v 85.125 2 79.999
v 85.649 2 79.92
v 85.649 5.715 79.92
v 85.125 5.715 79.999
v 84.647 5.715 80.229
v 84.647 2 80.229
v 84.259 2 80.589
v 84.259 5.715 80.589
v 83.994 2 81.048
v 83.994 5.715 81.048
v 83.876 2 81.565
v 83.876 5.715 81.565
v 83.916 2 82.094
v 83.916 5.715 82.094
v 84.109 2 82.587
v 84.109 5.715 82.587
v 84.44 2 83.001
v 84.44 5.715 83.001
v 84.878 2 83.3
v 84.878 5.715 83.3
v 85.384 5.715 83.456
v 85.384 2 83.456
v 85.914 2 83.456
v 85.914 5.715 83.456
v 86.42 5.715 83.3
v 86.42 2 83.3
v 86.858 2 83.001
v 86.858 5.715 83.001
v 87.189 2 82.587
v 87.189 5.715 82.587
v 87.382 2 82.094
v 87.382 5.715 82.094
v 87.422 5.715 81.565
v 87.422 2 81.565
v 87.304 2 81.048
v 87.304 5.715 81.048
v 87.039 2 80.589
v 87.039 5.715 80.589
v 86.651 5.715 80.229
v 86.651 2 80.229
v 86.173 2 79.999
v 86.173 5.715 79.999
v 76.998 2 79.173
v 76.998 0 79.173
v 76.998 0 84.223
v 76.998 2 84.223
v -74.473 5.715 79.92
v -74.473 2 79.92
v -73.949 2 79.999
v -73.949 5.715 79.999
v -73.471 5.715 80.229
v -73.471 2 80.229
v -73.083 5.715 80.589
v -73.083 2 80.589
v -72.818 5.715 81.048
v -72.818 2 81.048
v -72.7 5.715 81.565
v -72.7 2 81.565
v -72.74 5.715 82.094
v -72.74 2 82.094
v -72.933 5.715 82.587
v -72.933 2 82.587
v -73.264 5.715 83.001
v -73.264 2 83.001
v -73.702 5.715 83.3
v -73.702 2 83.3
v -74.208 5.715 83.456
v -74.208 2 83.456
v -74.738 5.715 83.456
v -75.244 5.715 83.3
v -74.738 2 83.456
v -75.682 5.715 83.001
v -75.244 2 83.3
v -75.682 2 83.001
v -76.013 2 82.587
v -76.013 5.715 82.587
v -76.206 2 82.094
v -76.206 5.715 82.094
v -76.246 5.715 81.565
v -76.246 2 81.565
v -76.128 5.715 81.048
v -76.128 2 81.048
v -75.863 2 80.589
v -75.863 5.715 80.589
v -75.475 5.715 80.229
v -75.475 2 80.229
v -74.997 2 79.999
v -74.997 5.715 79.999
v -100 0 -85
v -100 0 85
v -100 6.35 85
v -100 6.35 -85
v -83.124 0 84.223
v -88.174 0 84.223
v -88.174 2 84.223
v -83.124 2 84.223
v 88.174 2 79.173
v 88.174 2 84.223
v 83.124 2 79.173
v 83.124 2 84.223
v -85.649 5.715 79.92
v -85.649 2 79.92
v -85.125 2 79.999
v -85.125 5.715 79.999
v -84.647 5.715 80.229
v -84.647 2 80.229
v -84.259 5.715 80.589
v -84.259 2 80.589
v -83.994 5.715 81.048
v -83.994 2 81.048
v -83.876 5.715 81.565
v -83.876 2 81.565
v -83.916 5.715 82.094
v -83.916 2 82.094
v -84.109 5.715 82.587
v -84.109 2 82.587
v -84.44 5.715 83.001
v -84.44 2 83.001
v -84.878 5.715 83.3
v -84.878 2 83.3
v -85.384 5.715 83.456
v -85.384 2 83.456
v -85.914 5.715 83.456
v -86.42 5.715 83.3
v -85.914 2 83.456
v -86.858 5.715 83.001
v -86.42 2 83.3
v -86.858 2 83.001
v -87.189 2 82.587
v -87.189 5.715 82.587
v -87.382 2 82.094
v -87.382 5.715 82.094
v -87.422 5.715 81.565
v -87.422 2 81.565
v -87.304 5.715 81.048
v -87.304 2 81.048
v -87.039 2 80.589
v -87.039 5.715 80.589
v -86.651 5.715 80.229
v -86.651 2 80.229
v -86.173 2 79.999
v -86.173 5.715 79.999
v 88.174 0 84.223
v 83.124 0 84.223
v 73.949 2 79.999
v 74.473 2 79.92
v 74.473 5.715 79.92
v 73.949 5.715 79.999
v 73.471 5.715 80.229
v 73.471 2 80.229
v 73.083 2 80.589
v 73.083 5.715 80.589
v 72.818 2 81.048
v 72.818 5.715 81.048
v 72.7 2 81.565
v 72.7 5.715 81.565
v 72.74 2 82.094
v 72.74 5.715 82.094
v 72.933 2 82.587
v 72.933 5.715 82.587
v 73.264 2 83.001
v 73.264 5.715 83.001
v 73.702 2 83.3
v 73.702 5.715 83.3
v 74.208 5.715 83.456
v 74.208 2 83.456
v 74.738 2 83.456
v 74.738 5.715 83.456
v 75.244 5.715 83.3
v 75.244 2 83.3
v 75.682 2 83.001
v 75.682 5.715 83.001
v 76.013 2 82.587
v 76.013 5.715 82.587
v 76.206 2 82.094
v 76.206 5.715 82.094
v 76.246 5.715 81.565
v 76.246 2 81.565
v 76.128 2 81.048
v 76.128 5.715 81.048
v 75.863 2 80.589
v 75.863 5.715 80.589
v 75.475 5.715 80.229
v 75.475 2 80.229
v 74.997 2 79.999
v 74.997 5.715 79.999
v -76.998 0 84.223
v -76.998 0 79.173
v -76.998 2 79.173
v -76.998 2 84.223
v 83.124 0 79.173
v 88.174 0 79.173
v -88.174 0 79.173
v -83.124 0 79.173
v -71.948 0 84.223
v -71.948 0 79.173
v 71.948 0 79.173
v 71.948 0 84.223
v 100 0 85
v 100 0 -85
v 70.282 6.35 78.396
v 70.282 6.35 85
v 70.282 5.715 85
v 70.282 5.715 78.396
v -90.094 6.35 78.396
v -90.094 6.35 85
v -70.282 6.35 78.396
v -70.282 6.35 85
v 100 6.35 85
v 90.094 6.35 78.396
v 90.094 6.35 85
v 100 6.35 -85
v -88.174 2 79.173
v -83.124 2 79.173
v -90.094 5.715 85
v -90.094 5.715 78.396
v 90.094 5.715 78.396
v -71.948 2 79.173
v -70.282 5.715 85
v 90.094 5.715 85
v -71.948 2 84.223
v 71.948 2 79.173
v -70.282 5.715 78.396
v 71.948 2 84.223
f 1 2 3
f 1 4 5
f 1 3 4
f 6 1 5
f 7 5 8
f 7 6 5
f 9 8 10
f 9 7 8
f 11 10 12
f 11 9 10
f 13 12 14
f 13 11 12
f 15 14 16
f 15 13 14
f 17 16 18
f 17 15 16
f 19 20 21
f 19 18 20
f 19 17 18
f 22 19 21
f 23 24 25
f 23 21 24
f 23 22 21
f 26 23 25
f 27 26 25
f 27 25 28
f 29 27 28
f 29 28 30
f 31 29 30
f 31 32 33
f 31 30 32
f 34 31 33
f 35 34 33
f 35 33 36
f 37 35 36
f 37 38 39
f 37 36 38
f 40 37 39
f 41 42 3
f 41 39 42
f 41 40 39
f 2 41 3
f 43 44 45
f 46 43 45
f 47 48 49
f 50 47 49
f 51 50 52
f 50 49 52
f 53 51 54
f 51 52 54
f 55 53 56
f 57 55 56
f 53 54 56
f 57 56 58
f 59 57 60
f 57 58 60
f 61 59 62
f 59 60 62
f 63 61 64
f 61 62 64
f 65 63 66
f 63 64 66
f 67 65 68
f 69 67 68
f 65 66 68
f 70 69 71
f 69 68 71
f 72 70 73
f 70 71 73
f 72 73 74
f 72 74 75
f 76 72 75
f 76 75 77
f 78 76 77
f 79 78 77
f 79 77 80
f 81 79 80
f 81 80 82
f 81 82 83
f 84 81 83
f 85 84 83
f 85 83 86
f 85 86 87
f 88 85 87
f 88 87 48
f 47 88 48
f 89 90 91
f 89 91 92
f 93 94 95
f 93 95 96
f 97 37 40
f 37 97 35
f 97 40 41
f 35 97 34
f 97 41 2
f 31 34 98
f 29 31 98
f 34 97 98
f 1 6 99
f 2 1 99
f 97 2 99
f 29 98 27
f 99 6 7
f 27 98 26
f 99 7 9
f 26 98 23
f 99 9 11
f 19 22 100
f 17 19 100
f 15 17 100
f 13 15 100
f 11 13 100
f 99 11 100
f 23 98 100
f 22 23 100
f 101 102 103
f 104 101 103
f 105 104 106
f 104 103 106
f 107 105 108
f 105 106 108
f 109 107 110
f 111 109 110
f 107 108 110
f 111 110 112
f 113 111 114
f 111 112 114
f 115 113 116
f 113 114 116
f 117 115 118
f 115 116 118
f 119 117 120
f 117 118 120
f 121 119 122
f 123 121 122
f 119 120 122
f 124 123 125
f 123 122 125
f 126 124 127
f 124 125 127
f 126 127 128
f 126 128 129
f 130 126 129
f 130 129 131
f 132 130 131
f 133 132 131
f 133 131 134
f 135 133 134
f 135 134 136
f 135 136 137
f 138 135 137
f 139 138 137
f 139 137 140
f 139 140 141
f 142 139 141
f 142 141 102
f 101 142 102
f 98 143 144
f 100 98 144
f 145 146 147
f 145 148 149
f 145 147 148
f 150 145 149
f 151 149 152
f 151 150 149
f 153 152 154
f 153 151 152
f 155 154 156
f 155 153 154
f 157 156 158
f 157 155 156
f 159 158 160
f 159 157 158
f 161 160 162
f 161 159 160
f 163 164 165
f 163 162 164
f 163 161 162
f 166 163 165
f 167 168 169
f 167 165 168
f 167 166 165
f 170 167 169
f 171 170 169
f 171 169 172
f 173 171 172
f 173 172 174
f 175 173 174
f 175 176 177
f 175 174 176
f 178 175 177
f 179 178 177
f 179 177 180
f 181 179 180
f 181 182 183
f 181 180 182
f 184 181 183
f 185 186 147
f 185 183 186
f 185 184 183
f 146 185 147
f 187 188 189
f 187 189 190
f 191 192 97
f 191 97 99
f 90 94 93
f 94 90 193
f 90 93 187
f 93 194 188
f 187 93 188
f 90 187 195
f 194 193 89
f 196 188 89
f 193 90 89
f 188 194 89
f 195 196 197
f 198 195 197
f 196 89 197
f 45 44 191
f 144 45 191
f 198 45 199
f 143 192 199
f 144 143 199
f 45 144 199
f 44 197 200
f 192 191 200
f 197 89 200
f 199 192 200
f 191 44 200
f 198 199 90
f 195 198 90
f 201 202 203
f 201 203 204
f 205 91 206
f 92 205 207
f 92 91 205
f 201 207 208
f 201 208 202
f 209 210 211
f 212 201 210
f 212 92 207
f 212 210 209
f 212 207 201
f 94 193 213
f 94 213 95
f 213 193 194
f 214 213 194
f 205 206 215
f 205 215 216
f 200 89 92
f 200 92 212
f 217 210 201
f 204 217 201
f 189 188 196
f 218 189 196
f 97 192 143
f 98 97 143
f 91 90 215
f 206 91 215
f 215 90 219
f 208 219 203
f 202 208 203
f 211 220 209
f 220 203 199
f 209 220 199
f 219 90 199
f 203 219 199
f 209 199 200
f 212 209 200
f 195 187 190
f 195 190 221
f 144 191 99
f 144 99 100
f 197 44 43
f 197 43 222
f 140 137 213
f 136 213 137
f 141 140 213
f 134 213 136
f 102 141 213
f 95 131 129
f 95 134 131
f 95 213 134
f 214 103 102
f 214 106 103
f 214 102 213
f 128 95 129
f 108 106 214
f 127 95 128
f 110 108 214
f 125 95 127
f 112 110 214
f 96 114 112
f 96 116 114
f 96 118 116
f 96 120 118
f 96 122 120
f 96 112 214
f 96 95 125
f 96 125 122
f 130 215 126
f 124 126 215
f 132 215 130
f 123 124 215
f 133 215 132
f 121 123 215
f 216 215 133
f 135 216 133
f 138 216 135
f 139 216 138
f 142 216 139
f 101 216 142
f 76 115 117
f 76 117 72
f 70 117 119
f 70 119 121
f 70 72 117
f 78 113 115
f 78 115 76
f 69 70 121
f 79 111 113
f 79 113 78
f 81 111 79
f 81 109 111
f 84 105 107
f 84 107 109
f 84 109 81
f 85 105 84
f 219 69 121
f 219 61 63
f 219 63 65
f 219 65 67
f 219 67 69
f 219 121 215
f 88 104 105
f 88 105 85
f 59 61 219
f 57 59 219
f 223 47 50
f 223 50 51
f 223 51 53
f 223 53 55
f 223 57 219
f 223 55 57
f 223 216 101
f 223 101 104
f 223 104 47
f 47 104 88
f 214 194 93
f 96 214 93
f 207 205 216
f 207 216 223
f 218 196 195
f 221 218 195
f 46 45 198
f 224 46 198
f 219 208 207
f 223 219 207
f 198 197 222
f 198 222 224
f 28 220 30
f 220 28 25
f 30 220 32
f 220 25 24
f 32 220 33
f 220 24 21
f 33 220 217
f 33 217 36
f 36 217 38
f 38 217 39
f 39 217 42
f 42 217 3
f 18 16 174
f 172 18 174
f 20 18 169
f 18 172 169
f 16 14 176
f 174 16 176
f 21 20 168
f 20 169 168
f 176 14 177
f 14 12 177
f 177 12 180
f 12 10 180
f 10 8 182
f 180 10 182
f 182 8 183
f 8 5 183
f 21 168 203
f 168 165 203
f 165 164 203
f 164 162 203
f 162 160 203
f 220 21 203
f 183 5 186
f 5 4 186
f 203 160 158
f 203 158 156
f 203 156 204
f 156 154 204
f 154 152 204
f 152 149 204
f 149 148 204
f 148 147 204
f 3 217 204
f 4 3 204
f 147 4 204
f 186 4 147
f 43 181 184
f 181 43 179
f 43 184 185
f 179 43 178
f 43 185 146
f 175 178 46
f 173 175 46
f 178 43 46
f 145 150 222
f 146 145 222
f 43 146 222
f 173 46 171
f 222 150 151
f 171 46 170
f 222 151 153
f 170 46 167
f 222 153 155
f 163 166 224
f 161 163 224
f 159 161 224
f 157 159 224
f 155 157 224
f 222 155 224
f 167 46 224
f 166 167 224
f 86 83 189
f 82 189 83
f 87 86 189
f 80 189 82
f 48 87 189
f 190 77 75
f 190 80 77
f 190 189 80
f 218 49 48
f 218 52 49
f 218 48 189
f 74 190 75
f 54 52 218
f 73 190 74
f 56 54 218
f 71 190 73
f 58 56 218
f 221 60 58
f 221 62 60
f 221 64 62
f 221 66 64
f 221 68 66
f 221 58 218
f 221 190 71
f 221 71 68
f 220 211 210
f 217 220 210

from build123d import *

# Parameters (mm, degrees)
SKETCH1_W               = 200
SKETCH1_H               = 170
F_1_4_STEEL_PLATE_DEPTH = 6.35
SKETCH2_W               = 19.812
SKETCH2_H               = 6.604
BLADEHINGECUT_DEPTH     = 0.635
BLADEHINGEHOLE_D        = 3.556
SKETCH5_W               = 5.05
SKETCH5_H               = 5.05
BLADENUTCUT_DEPTH       = 2


with BuildPart() as part:
    # Sketch1 → 1/4" Steel Plate (new body)
    with BuildSketch(Plane(origin=(0, 0, 0), x_dir=(1, 0, 0), z_dir=(0, 1, 0))):
        Rectangle(SKETCH1_W, SKETCH1_H)
    extrude(amount=F_1_4_STEEL_PLATE_DEPTH)

    # Sketch2 → BladeHingeCut (cut)
    with BuildSketch(Plane(origin=(0, 6.35, 0), x_dir=(1, 0, 0), z_dir=(0, 1, 0))):
        with Locations((-80.188, -81.698)):
            Rectangle(SKETCH2_W, SKETCH2_H)
    bladehingecut = extrude(amount=-BLADEHINGECUT_DEPTH, mode=Mode.SUBTRACT)

    # BladeHingeHole (through all)
    with Locations(Plane(origin=(-74.473, 5.715, 81.698), x_dir=(0, 0, 1), z_dir=(0, 1, 0))):
        with Locations((0, 0), (0, -11.176)):
            bladehingehole = Hole(BLADEHINGEHOLE_D / 2)

    # Sketch5 → BladeNutCut (cut)
    with BuildSketch(Plane.XZ):
        with Locations((-85.649, 81.698)):
            Rectangle(SKETCH5_W, SKETCH5_H)
        with Locations((-74.473, 81.698)):
            Rectangle(SKETCH5_W, SKETCH5_H)
    bladenutcut = extrude(amount=-BLADENUTCUT_DEPTH, mode=Mode.SUBTRACT)

    # BladeHingeMirror: BladeHingeCut, BladeHingeHole, BladeNutCut across plane
    add(bladehingecut.mirror(Plane.ZY), mode=Mode.SUBTRACT)
    add(bladehingehole.mirror(Plane.ZY), mode=Mode.SUBTRACT)
    add(bladenutcut.mirror(Plane.ZY), mode=Mode.SUBTRACT)


solid = part.part
